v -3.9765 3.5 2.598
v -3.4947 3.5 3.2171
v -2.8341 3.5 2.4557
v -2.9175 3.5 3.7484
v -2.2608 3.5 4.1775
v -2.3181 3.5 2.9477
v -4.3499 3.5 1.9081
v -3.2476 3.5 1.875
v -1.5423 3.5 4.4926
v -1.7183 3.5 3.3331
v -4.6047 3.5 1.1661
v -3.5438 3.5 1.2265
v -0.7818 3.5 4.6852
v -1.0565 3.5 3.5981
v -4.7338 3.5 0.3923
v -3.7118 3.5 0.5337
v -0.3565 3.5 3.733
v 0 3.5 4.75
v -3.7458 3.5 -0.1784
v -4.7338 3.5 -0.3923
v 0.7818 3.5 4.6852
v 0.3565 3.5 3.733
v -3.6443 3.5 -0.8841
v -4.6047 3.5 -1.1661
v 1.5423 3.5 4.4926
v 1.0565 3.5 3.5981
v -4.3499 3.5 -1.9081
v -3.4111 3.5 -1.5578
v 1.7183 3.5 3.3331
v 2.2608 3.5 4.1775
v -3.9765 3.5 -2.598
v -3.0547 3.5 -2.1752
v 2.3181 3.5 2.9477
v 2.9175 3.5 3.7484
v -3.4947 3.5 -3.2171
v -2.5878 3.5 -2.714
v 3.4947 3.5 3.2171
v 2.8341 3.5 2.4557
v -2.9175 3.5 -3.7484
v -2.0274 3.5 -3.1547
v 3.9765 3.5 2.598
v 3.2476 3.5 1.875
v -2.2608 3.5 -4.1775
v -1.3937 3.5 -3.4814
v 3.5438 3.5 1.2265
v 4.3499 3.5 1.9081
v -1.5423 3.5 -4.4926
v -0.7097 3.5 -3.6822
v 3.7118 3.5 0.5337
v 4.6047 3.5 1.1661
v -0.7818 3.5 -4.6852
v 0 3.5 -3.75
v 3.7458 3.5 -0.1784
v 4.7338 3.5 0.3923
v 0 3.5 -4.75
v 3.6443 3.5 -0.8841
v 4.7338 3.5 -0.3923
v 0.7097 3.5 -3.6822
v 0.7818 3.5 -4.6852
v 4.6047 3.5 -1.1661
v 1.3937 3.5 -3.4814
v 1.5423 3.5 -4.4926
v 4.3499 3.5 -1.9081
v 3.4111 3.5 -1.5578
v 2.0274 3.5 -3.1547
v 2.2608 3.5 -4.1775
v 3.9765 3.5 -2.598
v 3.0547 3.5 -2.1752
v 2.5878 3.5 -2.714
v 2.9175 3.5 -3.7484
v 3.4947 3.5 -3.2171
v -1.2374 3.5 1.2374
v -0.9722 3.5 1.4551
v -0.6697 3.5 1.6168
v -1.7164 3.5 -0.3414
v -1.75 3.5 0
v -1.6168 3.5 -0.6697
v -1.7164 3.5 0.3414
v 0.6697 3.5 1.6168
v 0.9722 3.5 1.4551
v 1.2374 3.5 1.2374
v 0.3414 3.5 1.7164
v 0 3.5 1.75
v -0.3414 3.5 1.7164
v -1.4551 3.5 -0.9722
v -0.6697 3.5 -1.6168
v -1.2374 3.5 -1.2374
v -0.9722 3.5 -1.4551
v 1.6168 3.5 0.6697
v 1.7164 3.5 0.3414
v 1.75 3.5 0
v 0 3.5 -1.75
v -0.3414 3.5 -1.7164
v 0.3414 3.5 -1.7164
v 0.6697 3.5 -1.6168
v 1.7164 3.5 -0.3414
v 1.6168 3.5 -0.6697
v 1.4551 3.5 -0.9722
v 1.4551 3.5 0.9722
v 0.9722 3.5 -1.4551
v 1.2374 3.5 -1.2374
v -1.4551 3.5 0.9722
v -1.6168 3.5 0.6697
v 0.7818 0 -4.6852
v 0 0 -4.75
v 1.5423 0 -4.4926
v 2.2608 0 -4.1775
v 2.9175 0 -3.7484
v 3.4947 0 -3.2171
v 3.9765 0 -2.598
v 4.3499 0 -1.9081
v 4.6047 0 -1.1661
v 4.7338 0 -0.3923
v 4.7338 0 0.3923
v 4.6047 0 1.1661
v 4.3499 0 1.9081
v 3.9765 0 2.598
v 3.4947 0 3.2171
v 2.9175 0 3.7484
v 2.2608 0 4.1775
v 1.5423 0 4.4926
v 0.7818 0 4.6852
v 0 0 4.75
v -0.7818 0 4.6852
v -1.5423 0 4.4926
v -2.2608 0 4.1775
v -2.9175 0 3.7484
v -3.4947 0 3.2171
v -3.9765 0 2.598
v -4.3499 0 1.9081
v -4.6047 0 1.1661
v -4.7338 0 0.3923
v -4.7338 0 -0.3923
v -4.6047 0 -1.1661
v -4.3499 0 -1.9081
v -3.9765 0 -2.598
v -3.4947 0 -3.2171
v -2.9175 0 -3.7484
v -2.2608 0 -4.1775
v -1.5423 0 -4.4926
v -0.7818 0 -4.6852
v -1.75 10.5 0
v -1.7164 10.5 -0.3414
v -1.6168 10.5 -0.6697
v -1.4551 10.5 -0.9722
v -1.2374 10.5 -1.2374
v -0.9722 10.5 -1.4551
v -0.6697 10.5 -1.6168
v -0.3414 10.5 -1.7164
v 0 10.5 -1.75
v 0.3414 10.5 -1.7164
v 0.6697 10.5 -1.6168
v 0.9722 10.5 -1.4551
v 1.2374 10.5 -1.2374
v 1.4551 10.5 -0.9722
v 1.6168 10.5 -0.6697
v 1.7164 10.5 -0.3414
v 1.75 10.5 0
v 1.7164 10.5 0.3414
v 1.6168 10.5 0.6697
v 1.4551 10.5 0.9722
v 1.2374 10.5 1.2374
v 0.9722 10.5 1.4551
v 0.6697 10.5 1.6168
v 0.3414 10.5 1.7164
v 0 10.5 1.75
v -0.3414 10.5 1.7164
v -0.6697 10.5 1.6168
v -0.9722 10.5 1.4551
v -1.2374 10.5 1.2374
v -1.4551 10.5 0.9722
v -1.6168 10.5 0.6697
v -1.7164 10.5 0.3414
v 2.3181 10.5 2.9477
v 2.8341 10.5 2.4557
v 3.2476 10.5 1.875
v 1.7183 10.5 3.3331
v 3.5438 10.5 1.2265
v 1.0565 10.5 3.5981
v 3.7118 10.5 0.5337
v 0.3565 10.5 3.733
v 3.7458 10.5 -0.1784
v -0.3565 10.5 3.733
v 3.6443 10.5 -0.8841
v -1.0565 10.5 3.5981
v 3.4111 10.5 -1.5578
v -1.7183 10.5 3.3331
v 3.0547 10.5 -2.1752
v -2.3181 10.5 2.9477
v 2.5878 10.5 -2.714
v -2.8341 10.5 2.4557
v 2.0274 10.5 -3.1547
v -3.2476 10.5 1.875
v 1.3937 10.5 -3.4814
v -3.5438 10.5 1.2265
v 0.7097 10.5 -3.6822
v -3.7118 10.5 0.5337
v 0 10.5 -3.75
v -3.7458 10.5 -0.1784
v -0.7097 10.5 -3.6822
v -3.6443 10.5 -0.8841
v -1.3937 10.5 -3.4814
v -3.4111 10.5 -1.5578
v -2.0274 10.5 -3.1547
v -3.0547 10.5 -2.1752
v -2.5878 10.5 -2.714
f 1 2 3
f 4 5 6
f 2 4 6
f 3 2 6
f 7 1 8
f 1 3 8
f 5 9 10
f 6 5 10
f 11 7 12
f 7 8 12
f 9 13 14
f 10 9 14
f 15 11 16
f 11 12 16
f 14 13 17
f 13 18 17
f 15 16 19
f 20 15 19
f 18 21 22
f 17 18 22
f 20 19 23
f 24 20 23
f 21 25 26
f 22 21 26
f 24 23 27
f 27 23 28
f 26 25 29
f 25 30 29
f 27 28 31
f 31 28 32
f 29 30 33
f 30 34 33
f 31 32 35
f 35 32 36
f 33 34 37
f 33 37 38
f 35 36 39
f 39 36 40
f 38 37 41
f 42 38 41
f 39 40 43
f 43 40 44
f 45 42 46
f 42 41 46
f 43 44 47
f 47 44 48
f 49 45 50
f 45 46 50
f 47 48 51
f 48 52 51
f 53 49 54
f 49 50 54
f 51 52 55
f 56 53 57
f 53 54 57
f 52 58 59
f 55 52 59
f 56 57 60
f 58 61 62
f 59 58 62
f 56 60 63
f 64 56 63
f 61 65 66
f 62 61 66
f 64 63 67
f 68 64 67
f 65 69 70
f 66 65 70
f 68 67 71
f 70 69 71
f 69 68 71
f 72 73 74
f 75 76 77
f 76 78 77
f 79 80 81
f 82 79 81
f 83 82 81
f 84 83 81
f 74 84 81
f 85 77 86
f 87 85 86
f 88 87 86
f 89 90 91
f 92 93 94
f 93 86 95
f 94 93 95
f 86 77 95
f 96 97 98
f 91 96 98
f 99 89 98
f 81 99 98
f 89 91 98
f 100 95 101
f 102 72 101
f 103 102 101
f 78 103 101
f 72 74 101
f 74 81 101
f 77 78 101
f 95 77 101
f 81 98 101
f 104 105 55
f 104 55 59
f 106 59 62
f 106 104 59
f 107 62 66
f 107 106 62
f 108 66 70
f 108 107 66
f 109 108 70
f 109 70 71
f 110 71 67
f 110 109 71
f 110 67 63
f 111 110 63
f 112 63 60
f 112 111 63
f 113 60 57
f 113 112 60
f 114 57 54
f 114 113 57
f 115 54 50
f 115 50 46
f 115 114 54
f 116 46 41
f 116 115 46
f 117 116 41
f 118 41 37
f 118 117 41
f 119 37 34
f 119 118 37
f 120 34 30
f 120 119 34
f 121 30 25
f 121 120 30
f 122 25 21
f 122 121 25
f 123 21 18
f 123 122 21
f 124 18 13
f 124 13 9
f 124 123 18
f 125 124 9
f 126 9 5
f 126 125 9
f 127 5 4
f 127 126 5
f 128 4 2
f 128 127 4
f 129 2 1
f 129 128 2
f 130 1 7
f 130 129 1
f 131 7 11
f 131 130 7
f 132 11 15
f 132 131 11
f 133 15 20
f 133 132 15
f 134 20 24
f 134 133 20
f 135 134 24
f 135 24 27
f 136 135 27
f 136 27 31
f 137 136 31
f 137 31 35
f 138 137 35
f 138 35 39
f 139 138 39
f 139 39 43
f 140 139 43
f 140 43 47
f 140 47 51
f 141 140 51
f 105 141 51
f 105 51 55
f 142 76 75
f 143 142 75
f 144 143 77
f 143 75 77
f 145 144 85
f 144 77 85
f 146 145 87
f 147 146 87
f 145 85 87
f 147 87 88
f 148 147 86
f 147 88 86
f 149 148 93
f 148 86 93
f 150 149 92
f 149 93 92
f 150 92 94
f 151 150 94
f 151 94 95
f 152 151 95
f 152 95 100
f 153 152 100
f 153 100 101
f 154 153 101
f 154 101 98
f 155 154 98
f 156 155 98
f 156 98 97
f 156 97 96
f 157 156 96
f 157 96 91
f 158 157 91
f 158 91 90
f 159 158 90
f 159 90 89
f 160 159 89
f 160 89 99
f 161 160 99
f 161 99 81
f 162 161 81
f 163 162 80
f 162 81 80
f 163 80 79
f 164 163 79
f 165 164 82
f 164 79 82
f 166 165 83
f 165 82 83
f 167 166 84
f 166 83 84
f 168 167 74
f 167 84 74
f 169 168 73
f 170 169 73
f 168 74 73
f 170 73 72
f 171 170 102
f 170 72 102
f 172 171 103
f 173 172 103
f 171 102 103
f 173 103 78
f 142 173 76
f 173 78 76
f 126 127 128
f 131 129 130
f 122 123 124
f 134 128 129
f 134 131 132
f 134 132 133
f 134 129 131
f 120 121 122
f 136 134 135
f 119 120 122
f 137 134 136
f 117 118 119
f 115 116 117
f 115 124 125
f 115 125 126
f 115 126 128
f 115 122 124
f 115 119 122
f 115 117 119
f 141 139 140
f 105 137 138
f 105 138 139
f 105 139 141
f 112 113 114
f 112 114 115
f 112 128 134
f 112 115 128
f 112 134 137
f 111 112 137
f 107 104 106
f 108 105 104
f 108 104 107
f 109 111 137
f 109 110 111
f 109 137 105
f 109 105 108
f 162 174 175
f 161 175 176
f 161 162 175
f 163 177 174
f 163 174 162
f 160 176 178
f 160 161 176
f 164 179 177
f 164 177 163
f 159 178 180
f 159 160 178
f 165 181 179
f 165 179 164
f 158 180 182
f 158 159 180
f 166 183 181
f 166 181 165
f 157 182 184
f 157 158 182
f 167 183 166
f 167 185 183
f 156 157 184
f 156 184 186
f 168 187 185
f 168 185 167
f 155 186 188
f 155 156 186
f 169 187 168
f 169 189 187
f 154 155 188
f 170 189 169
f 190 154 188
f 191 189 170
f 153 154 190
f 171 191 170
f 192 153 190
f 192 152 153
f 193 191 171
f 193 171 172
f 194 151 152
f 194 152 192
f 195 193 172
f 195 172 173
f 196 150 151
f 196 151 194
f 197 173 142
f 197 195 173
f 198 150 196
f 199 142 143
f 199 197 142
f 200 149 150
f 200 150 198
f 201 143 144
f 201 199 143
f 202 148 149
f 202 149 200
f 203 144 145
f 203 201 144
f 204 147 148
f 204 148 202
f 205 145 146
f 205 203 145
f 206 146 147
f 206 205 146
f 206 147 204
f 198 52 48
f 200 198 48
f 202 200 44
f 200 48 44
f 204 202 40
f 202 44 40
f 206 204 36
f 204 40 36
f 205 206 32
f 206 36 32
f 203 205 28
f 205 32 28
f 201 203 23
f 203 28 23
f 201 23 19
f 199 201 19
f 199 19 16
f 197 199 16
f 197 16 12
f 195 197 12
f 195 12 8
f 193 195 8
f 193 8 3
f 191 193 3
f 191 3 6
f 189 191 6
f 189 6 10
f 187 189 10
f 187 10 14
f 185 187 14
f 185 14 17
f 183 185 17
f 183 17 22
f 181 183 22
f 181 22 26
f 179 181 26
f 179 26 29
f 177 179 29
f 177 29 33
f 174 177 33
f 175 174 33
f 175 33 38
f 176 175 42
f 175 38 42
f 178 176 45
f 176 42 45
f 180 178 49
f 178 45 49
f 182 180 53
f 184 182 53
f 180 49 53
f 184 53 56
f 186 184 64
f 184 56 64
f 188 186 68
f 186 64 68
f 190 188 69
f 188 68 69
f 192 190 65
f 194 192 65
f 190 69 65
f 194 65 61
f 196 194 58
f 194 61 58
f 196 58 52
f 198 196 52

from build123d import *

# Parameters (mm, degrees)
SKETCH1_R                  = 3.75
BOSS_EXTRUDE1_DEPTH        = 10.5
F_3_5_3_5_DIAMETER_HOLE1_D = 3.5
SKETCH4_R                  = 4.75
BOSS_EXTRUDE2_DEPTH        = 3.5


with BuildPart() as part:
    # Sketch1 → Boss-Extrude1 (new body)
    with BuildSketch(Plane(origin=(0, 0, 0), x_dir=(1, 0, 0), z_dir=(0, 1, 0))):
        with Locations(Location((0, 0, 0), (0, 0, 90))):
            Circle(SKETCH1_R)
    extrude(amount=BOSS_EXTRUDE1_DEPTH)

    # Ø3.5 (3.5) Diameter Hole1 (through all)
    with Locations(Plane(origin=(0, 10.5, 0), x_dir=(1, 0, 0), z_dir=(0, 1, 0))):
        with Locations((0, 0)):
            Hole(F_3_5_3_5_DIAMETER_HOLE1_D / 2)

    # Sketch4 → Boss-Extrude2 (add)
    with BuildSketch(Plane.XZ):
        with Locations(Location((0, 0, 0), (0, 0, 270))):
            Circle(SKETCH4_R)
    extrude(amount=-BOSS_EXTRUDE2_DEPTH)


solid = part.part
